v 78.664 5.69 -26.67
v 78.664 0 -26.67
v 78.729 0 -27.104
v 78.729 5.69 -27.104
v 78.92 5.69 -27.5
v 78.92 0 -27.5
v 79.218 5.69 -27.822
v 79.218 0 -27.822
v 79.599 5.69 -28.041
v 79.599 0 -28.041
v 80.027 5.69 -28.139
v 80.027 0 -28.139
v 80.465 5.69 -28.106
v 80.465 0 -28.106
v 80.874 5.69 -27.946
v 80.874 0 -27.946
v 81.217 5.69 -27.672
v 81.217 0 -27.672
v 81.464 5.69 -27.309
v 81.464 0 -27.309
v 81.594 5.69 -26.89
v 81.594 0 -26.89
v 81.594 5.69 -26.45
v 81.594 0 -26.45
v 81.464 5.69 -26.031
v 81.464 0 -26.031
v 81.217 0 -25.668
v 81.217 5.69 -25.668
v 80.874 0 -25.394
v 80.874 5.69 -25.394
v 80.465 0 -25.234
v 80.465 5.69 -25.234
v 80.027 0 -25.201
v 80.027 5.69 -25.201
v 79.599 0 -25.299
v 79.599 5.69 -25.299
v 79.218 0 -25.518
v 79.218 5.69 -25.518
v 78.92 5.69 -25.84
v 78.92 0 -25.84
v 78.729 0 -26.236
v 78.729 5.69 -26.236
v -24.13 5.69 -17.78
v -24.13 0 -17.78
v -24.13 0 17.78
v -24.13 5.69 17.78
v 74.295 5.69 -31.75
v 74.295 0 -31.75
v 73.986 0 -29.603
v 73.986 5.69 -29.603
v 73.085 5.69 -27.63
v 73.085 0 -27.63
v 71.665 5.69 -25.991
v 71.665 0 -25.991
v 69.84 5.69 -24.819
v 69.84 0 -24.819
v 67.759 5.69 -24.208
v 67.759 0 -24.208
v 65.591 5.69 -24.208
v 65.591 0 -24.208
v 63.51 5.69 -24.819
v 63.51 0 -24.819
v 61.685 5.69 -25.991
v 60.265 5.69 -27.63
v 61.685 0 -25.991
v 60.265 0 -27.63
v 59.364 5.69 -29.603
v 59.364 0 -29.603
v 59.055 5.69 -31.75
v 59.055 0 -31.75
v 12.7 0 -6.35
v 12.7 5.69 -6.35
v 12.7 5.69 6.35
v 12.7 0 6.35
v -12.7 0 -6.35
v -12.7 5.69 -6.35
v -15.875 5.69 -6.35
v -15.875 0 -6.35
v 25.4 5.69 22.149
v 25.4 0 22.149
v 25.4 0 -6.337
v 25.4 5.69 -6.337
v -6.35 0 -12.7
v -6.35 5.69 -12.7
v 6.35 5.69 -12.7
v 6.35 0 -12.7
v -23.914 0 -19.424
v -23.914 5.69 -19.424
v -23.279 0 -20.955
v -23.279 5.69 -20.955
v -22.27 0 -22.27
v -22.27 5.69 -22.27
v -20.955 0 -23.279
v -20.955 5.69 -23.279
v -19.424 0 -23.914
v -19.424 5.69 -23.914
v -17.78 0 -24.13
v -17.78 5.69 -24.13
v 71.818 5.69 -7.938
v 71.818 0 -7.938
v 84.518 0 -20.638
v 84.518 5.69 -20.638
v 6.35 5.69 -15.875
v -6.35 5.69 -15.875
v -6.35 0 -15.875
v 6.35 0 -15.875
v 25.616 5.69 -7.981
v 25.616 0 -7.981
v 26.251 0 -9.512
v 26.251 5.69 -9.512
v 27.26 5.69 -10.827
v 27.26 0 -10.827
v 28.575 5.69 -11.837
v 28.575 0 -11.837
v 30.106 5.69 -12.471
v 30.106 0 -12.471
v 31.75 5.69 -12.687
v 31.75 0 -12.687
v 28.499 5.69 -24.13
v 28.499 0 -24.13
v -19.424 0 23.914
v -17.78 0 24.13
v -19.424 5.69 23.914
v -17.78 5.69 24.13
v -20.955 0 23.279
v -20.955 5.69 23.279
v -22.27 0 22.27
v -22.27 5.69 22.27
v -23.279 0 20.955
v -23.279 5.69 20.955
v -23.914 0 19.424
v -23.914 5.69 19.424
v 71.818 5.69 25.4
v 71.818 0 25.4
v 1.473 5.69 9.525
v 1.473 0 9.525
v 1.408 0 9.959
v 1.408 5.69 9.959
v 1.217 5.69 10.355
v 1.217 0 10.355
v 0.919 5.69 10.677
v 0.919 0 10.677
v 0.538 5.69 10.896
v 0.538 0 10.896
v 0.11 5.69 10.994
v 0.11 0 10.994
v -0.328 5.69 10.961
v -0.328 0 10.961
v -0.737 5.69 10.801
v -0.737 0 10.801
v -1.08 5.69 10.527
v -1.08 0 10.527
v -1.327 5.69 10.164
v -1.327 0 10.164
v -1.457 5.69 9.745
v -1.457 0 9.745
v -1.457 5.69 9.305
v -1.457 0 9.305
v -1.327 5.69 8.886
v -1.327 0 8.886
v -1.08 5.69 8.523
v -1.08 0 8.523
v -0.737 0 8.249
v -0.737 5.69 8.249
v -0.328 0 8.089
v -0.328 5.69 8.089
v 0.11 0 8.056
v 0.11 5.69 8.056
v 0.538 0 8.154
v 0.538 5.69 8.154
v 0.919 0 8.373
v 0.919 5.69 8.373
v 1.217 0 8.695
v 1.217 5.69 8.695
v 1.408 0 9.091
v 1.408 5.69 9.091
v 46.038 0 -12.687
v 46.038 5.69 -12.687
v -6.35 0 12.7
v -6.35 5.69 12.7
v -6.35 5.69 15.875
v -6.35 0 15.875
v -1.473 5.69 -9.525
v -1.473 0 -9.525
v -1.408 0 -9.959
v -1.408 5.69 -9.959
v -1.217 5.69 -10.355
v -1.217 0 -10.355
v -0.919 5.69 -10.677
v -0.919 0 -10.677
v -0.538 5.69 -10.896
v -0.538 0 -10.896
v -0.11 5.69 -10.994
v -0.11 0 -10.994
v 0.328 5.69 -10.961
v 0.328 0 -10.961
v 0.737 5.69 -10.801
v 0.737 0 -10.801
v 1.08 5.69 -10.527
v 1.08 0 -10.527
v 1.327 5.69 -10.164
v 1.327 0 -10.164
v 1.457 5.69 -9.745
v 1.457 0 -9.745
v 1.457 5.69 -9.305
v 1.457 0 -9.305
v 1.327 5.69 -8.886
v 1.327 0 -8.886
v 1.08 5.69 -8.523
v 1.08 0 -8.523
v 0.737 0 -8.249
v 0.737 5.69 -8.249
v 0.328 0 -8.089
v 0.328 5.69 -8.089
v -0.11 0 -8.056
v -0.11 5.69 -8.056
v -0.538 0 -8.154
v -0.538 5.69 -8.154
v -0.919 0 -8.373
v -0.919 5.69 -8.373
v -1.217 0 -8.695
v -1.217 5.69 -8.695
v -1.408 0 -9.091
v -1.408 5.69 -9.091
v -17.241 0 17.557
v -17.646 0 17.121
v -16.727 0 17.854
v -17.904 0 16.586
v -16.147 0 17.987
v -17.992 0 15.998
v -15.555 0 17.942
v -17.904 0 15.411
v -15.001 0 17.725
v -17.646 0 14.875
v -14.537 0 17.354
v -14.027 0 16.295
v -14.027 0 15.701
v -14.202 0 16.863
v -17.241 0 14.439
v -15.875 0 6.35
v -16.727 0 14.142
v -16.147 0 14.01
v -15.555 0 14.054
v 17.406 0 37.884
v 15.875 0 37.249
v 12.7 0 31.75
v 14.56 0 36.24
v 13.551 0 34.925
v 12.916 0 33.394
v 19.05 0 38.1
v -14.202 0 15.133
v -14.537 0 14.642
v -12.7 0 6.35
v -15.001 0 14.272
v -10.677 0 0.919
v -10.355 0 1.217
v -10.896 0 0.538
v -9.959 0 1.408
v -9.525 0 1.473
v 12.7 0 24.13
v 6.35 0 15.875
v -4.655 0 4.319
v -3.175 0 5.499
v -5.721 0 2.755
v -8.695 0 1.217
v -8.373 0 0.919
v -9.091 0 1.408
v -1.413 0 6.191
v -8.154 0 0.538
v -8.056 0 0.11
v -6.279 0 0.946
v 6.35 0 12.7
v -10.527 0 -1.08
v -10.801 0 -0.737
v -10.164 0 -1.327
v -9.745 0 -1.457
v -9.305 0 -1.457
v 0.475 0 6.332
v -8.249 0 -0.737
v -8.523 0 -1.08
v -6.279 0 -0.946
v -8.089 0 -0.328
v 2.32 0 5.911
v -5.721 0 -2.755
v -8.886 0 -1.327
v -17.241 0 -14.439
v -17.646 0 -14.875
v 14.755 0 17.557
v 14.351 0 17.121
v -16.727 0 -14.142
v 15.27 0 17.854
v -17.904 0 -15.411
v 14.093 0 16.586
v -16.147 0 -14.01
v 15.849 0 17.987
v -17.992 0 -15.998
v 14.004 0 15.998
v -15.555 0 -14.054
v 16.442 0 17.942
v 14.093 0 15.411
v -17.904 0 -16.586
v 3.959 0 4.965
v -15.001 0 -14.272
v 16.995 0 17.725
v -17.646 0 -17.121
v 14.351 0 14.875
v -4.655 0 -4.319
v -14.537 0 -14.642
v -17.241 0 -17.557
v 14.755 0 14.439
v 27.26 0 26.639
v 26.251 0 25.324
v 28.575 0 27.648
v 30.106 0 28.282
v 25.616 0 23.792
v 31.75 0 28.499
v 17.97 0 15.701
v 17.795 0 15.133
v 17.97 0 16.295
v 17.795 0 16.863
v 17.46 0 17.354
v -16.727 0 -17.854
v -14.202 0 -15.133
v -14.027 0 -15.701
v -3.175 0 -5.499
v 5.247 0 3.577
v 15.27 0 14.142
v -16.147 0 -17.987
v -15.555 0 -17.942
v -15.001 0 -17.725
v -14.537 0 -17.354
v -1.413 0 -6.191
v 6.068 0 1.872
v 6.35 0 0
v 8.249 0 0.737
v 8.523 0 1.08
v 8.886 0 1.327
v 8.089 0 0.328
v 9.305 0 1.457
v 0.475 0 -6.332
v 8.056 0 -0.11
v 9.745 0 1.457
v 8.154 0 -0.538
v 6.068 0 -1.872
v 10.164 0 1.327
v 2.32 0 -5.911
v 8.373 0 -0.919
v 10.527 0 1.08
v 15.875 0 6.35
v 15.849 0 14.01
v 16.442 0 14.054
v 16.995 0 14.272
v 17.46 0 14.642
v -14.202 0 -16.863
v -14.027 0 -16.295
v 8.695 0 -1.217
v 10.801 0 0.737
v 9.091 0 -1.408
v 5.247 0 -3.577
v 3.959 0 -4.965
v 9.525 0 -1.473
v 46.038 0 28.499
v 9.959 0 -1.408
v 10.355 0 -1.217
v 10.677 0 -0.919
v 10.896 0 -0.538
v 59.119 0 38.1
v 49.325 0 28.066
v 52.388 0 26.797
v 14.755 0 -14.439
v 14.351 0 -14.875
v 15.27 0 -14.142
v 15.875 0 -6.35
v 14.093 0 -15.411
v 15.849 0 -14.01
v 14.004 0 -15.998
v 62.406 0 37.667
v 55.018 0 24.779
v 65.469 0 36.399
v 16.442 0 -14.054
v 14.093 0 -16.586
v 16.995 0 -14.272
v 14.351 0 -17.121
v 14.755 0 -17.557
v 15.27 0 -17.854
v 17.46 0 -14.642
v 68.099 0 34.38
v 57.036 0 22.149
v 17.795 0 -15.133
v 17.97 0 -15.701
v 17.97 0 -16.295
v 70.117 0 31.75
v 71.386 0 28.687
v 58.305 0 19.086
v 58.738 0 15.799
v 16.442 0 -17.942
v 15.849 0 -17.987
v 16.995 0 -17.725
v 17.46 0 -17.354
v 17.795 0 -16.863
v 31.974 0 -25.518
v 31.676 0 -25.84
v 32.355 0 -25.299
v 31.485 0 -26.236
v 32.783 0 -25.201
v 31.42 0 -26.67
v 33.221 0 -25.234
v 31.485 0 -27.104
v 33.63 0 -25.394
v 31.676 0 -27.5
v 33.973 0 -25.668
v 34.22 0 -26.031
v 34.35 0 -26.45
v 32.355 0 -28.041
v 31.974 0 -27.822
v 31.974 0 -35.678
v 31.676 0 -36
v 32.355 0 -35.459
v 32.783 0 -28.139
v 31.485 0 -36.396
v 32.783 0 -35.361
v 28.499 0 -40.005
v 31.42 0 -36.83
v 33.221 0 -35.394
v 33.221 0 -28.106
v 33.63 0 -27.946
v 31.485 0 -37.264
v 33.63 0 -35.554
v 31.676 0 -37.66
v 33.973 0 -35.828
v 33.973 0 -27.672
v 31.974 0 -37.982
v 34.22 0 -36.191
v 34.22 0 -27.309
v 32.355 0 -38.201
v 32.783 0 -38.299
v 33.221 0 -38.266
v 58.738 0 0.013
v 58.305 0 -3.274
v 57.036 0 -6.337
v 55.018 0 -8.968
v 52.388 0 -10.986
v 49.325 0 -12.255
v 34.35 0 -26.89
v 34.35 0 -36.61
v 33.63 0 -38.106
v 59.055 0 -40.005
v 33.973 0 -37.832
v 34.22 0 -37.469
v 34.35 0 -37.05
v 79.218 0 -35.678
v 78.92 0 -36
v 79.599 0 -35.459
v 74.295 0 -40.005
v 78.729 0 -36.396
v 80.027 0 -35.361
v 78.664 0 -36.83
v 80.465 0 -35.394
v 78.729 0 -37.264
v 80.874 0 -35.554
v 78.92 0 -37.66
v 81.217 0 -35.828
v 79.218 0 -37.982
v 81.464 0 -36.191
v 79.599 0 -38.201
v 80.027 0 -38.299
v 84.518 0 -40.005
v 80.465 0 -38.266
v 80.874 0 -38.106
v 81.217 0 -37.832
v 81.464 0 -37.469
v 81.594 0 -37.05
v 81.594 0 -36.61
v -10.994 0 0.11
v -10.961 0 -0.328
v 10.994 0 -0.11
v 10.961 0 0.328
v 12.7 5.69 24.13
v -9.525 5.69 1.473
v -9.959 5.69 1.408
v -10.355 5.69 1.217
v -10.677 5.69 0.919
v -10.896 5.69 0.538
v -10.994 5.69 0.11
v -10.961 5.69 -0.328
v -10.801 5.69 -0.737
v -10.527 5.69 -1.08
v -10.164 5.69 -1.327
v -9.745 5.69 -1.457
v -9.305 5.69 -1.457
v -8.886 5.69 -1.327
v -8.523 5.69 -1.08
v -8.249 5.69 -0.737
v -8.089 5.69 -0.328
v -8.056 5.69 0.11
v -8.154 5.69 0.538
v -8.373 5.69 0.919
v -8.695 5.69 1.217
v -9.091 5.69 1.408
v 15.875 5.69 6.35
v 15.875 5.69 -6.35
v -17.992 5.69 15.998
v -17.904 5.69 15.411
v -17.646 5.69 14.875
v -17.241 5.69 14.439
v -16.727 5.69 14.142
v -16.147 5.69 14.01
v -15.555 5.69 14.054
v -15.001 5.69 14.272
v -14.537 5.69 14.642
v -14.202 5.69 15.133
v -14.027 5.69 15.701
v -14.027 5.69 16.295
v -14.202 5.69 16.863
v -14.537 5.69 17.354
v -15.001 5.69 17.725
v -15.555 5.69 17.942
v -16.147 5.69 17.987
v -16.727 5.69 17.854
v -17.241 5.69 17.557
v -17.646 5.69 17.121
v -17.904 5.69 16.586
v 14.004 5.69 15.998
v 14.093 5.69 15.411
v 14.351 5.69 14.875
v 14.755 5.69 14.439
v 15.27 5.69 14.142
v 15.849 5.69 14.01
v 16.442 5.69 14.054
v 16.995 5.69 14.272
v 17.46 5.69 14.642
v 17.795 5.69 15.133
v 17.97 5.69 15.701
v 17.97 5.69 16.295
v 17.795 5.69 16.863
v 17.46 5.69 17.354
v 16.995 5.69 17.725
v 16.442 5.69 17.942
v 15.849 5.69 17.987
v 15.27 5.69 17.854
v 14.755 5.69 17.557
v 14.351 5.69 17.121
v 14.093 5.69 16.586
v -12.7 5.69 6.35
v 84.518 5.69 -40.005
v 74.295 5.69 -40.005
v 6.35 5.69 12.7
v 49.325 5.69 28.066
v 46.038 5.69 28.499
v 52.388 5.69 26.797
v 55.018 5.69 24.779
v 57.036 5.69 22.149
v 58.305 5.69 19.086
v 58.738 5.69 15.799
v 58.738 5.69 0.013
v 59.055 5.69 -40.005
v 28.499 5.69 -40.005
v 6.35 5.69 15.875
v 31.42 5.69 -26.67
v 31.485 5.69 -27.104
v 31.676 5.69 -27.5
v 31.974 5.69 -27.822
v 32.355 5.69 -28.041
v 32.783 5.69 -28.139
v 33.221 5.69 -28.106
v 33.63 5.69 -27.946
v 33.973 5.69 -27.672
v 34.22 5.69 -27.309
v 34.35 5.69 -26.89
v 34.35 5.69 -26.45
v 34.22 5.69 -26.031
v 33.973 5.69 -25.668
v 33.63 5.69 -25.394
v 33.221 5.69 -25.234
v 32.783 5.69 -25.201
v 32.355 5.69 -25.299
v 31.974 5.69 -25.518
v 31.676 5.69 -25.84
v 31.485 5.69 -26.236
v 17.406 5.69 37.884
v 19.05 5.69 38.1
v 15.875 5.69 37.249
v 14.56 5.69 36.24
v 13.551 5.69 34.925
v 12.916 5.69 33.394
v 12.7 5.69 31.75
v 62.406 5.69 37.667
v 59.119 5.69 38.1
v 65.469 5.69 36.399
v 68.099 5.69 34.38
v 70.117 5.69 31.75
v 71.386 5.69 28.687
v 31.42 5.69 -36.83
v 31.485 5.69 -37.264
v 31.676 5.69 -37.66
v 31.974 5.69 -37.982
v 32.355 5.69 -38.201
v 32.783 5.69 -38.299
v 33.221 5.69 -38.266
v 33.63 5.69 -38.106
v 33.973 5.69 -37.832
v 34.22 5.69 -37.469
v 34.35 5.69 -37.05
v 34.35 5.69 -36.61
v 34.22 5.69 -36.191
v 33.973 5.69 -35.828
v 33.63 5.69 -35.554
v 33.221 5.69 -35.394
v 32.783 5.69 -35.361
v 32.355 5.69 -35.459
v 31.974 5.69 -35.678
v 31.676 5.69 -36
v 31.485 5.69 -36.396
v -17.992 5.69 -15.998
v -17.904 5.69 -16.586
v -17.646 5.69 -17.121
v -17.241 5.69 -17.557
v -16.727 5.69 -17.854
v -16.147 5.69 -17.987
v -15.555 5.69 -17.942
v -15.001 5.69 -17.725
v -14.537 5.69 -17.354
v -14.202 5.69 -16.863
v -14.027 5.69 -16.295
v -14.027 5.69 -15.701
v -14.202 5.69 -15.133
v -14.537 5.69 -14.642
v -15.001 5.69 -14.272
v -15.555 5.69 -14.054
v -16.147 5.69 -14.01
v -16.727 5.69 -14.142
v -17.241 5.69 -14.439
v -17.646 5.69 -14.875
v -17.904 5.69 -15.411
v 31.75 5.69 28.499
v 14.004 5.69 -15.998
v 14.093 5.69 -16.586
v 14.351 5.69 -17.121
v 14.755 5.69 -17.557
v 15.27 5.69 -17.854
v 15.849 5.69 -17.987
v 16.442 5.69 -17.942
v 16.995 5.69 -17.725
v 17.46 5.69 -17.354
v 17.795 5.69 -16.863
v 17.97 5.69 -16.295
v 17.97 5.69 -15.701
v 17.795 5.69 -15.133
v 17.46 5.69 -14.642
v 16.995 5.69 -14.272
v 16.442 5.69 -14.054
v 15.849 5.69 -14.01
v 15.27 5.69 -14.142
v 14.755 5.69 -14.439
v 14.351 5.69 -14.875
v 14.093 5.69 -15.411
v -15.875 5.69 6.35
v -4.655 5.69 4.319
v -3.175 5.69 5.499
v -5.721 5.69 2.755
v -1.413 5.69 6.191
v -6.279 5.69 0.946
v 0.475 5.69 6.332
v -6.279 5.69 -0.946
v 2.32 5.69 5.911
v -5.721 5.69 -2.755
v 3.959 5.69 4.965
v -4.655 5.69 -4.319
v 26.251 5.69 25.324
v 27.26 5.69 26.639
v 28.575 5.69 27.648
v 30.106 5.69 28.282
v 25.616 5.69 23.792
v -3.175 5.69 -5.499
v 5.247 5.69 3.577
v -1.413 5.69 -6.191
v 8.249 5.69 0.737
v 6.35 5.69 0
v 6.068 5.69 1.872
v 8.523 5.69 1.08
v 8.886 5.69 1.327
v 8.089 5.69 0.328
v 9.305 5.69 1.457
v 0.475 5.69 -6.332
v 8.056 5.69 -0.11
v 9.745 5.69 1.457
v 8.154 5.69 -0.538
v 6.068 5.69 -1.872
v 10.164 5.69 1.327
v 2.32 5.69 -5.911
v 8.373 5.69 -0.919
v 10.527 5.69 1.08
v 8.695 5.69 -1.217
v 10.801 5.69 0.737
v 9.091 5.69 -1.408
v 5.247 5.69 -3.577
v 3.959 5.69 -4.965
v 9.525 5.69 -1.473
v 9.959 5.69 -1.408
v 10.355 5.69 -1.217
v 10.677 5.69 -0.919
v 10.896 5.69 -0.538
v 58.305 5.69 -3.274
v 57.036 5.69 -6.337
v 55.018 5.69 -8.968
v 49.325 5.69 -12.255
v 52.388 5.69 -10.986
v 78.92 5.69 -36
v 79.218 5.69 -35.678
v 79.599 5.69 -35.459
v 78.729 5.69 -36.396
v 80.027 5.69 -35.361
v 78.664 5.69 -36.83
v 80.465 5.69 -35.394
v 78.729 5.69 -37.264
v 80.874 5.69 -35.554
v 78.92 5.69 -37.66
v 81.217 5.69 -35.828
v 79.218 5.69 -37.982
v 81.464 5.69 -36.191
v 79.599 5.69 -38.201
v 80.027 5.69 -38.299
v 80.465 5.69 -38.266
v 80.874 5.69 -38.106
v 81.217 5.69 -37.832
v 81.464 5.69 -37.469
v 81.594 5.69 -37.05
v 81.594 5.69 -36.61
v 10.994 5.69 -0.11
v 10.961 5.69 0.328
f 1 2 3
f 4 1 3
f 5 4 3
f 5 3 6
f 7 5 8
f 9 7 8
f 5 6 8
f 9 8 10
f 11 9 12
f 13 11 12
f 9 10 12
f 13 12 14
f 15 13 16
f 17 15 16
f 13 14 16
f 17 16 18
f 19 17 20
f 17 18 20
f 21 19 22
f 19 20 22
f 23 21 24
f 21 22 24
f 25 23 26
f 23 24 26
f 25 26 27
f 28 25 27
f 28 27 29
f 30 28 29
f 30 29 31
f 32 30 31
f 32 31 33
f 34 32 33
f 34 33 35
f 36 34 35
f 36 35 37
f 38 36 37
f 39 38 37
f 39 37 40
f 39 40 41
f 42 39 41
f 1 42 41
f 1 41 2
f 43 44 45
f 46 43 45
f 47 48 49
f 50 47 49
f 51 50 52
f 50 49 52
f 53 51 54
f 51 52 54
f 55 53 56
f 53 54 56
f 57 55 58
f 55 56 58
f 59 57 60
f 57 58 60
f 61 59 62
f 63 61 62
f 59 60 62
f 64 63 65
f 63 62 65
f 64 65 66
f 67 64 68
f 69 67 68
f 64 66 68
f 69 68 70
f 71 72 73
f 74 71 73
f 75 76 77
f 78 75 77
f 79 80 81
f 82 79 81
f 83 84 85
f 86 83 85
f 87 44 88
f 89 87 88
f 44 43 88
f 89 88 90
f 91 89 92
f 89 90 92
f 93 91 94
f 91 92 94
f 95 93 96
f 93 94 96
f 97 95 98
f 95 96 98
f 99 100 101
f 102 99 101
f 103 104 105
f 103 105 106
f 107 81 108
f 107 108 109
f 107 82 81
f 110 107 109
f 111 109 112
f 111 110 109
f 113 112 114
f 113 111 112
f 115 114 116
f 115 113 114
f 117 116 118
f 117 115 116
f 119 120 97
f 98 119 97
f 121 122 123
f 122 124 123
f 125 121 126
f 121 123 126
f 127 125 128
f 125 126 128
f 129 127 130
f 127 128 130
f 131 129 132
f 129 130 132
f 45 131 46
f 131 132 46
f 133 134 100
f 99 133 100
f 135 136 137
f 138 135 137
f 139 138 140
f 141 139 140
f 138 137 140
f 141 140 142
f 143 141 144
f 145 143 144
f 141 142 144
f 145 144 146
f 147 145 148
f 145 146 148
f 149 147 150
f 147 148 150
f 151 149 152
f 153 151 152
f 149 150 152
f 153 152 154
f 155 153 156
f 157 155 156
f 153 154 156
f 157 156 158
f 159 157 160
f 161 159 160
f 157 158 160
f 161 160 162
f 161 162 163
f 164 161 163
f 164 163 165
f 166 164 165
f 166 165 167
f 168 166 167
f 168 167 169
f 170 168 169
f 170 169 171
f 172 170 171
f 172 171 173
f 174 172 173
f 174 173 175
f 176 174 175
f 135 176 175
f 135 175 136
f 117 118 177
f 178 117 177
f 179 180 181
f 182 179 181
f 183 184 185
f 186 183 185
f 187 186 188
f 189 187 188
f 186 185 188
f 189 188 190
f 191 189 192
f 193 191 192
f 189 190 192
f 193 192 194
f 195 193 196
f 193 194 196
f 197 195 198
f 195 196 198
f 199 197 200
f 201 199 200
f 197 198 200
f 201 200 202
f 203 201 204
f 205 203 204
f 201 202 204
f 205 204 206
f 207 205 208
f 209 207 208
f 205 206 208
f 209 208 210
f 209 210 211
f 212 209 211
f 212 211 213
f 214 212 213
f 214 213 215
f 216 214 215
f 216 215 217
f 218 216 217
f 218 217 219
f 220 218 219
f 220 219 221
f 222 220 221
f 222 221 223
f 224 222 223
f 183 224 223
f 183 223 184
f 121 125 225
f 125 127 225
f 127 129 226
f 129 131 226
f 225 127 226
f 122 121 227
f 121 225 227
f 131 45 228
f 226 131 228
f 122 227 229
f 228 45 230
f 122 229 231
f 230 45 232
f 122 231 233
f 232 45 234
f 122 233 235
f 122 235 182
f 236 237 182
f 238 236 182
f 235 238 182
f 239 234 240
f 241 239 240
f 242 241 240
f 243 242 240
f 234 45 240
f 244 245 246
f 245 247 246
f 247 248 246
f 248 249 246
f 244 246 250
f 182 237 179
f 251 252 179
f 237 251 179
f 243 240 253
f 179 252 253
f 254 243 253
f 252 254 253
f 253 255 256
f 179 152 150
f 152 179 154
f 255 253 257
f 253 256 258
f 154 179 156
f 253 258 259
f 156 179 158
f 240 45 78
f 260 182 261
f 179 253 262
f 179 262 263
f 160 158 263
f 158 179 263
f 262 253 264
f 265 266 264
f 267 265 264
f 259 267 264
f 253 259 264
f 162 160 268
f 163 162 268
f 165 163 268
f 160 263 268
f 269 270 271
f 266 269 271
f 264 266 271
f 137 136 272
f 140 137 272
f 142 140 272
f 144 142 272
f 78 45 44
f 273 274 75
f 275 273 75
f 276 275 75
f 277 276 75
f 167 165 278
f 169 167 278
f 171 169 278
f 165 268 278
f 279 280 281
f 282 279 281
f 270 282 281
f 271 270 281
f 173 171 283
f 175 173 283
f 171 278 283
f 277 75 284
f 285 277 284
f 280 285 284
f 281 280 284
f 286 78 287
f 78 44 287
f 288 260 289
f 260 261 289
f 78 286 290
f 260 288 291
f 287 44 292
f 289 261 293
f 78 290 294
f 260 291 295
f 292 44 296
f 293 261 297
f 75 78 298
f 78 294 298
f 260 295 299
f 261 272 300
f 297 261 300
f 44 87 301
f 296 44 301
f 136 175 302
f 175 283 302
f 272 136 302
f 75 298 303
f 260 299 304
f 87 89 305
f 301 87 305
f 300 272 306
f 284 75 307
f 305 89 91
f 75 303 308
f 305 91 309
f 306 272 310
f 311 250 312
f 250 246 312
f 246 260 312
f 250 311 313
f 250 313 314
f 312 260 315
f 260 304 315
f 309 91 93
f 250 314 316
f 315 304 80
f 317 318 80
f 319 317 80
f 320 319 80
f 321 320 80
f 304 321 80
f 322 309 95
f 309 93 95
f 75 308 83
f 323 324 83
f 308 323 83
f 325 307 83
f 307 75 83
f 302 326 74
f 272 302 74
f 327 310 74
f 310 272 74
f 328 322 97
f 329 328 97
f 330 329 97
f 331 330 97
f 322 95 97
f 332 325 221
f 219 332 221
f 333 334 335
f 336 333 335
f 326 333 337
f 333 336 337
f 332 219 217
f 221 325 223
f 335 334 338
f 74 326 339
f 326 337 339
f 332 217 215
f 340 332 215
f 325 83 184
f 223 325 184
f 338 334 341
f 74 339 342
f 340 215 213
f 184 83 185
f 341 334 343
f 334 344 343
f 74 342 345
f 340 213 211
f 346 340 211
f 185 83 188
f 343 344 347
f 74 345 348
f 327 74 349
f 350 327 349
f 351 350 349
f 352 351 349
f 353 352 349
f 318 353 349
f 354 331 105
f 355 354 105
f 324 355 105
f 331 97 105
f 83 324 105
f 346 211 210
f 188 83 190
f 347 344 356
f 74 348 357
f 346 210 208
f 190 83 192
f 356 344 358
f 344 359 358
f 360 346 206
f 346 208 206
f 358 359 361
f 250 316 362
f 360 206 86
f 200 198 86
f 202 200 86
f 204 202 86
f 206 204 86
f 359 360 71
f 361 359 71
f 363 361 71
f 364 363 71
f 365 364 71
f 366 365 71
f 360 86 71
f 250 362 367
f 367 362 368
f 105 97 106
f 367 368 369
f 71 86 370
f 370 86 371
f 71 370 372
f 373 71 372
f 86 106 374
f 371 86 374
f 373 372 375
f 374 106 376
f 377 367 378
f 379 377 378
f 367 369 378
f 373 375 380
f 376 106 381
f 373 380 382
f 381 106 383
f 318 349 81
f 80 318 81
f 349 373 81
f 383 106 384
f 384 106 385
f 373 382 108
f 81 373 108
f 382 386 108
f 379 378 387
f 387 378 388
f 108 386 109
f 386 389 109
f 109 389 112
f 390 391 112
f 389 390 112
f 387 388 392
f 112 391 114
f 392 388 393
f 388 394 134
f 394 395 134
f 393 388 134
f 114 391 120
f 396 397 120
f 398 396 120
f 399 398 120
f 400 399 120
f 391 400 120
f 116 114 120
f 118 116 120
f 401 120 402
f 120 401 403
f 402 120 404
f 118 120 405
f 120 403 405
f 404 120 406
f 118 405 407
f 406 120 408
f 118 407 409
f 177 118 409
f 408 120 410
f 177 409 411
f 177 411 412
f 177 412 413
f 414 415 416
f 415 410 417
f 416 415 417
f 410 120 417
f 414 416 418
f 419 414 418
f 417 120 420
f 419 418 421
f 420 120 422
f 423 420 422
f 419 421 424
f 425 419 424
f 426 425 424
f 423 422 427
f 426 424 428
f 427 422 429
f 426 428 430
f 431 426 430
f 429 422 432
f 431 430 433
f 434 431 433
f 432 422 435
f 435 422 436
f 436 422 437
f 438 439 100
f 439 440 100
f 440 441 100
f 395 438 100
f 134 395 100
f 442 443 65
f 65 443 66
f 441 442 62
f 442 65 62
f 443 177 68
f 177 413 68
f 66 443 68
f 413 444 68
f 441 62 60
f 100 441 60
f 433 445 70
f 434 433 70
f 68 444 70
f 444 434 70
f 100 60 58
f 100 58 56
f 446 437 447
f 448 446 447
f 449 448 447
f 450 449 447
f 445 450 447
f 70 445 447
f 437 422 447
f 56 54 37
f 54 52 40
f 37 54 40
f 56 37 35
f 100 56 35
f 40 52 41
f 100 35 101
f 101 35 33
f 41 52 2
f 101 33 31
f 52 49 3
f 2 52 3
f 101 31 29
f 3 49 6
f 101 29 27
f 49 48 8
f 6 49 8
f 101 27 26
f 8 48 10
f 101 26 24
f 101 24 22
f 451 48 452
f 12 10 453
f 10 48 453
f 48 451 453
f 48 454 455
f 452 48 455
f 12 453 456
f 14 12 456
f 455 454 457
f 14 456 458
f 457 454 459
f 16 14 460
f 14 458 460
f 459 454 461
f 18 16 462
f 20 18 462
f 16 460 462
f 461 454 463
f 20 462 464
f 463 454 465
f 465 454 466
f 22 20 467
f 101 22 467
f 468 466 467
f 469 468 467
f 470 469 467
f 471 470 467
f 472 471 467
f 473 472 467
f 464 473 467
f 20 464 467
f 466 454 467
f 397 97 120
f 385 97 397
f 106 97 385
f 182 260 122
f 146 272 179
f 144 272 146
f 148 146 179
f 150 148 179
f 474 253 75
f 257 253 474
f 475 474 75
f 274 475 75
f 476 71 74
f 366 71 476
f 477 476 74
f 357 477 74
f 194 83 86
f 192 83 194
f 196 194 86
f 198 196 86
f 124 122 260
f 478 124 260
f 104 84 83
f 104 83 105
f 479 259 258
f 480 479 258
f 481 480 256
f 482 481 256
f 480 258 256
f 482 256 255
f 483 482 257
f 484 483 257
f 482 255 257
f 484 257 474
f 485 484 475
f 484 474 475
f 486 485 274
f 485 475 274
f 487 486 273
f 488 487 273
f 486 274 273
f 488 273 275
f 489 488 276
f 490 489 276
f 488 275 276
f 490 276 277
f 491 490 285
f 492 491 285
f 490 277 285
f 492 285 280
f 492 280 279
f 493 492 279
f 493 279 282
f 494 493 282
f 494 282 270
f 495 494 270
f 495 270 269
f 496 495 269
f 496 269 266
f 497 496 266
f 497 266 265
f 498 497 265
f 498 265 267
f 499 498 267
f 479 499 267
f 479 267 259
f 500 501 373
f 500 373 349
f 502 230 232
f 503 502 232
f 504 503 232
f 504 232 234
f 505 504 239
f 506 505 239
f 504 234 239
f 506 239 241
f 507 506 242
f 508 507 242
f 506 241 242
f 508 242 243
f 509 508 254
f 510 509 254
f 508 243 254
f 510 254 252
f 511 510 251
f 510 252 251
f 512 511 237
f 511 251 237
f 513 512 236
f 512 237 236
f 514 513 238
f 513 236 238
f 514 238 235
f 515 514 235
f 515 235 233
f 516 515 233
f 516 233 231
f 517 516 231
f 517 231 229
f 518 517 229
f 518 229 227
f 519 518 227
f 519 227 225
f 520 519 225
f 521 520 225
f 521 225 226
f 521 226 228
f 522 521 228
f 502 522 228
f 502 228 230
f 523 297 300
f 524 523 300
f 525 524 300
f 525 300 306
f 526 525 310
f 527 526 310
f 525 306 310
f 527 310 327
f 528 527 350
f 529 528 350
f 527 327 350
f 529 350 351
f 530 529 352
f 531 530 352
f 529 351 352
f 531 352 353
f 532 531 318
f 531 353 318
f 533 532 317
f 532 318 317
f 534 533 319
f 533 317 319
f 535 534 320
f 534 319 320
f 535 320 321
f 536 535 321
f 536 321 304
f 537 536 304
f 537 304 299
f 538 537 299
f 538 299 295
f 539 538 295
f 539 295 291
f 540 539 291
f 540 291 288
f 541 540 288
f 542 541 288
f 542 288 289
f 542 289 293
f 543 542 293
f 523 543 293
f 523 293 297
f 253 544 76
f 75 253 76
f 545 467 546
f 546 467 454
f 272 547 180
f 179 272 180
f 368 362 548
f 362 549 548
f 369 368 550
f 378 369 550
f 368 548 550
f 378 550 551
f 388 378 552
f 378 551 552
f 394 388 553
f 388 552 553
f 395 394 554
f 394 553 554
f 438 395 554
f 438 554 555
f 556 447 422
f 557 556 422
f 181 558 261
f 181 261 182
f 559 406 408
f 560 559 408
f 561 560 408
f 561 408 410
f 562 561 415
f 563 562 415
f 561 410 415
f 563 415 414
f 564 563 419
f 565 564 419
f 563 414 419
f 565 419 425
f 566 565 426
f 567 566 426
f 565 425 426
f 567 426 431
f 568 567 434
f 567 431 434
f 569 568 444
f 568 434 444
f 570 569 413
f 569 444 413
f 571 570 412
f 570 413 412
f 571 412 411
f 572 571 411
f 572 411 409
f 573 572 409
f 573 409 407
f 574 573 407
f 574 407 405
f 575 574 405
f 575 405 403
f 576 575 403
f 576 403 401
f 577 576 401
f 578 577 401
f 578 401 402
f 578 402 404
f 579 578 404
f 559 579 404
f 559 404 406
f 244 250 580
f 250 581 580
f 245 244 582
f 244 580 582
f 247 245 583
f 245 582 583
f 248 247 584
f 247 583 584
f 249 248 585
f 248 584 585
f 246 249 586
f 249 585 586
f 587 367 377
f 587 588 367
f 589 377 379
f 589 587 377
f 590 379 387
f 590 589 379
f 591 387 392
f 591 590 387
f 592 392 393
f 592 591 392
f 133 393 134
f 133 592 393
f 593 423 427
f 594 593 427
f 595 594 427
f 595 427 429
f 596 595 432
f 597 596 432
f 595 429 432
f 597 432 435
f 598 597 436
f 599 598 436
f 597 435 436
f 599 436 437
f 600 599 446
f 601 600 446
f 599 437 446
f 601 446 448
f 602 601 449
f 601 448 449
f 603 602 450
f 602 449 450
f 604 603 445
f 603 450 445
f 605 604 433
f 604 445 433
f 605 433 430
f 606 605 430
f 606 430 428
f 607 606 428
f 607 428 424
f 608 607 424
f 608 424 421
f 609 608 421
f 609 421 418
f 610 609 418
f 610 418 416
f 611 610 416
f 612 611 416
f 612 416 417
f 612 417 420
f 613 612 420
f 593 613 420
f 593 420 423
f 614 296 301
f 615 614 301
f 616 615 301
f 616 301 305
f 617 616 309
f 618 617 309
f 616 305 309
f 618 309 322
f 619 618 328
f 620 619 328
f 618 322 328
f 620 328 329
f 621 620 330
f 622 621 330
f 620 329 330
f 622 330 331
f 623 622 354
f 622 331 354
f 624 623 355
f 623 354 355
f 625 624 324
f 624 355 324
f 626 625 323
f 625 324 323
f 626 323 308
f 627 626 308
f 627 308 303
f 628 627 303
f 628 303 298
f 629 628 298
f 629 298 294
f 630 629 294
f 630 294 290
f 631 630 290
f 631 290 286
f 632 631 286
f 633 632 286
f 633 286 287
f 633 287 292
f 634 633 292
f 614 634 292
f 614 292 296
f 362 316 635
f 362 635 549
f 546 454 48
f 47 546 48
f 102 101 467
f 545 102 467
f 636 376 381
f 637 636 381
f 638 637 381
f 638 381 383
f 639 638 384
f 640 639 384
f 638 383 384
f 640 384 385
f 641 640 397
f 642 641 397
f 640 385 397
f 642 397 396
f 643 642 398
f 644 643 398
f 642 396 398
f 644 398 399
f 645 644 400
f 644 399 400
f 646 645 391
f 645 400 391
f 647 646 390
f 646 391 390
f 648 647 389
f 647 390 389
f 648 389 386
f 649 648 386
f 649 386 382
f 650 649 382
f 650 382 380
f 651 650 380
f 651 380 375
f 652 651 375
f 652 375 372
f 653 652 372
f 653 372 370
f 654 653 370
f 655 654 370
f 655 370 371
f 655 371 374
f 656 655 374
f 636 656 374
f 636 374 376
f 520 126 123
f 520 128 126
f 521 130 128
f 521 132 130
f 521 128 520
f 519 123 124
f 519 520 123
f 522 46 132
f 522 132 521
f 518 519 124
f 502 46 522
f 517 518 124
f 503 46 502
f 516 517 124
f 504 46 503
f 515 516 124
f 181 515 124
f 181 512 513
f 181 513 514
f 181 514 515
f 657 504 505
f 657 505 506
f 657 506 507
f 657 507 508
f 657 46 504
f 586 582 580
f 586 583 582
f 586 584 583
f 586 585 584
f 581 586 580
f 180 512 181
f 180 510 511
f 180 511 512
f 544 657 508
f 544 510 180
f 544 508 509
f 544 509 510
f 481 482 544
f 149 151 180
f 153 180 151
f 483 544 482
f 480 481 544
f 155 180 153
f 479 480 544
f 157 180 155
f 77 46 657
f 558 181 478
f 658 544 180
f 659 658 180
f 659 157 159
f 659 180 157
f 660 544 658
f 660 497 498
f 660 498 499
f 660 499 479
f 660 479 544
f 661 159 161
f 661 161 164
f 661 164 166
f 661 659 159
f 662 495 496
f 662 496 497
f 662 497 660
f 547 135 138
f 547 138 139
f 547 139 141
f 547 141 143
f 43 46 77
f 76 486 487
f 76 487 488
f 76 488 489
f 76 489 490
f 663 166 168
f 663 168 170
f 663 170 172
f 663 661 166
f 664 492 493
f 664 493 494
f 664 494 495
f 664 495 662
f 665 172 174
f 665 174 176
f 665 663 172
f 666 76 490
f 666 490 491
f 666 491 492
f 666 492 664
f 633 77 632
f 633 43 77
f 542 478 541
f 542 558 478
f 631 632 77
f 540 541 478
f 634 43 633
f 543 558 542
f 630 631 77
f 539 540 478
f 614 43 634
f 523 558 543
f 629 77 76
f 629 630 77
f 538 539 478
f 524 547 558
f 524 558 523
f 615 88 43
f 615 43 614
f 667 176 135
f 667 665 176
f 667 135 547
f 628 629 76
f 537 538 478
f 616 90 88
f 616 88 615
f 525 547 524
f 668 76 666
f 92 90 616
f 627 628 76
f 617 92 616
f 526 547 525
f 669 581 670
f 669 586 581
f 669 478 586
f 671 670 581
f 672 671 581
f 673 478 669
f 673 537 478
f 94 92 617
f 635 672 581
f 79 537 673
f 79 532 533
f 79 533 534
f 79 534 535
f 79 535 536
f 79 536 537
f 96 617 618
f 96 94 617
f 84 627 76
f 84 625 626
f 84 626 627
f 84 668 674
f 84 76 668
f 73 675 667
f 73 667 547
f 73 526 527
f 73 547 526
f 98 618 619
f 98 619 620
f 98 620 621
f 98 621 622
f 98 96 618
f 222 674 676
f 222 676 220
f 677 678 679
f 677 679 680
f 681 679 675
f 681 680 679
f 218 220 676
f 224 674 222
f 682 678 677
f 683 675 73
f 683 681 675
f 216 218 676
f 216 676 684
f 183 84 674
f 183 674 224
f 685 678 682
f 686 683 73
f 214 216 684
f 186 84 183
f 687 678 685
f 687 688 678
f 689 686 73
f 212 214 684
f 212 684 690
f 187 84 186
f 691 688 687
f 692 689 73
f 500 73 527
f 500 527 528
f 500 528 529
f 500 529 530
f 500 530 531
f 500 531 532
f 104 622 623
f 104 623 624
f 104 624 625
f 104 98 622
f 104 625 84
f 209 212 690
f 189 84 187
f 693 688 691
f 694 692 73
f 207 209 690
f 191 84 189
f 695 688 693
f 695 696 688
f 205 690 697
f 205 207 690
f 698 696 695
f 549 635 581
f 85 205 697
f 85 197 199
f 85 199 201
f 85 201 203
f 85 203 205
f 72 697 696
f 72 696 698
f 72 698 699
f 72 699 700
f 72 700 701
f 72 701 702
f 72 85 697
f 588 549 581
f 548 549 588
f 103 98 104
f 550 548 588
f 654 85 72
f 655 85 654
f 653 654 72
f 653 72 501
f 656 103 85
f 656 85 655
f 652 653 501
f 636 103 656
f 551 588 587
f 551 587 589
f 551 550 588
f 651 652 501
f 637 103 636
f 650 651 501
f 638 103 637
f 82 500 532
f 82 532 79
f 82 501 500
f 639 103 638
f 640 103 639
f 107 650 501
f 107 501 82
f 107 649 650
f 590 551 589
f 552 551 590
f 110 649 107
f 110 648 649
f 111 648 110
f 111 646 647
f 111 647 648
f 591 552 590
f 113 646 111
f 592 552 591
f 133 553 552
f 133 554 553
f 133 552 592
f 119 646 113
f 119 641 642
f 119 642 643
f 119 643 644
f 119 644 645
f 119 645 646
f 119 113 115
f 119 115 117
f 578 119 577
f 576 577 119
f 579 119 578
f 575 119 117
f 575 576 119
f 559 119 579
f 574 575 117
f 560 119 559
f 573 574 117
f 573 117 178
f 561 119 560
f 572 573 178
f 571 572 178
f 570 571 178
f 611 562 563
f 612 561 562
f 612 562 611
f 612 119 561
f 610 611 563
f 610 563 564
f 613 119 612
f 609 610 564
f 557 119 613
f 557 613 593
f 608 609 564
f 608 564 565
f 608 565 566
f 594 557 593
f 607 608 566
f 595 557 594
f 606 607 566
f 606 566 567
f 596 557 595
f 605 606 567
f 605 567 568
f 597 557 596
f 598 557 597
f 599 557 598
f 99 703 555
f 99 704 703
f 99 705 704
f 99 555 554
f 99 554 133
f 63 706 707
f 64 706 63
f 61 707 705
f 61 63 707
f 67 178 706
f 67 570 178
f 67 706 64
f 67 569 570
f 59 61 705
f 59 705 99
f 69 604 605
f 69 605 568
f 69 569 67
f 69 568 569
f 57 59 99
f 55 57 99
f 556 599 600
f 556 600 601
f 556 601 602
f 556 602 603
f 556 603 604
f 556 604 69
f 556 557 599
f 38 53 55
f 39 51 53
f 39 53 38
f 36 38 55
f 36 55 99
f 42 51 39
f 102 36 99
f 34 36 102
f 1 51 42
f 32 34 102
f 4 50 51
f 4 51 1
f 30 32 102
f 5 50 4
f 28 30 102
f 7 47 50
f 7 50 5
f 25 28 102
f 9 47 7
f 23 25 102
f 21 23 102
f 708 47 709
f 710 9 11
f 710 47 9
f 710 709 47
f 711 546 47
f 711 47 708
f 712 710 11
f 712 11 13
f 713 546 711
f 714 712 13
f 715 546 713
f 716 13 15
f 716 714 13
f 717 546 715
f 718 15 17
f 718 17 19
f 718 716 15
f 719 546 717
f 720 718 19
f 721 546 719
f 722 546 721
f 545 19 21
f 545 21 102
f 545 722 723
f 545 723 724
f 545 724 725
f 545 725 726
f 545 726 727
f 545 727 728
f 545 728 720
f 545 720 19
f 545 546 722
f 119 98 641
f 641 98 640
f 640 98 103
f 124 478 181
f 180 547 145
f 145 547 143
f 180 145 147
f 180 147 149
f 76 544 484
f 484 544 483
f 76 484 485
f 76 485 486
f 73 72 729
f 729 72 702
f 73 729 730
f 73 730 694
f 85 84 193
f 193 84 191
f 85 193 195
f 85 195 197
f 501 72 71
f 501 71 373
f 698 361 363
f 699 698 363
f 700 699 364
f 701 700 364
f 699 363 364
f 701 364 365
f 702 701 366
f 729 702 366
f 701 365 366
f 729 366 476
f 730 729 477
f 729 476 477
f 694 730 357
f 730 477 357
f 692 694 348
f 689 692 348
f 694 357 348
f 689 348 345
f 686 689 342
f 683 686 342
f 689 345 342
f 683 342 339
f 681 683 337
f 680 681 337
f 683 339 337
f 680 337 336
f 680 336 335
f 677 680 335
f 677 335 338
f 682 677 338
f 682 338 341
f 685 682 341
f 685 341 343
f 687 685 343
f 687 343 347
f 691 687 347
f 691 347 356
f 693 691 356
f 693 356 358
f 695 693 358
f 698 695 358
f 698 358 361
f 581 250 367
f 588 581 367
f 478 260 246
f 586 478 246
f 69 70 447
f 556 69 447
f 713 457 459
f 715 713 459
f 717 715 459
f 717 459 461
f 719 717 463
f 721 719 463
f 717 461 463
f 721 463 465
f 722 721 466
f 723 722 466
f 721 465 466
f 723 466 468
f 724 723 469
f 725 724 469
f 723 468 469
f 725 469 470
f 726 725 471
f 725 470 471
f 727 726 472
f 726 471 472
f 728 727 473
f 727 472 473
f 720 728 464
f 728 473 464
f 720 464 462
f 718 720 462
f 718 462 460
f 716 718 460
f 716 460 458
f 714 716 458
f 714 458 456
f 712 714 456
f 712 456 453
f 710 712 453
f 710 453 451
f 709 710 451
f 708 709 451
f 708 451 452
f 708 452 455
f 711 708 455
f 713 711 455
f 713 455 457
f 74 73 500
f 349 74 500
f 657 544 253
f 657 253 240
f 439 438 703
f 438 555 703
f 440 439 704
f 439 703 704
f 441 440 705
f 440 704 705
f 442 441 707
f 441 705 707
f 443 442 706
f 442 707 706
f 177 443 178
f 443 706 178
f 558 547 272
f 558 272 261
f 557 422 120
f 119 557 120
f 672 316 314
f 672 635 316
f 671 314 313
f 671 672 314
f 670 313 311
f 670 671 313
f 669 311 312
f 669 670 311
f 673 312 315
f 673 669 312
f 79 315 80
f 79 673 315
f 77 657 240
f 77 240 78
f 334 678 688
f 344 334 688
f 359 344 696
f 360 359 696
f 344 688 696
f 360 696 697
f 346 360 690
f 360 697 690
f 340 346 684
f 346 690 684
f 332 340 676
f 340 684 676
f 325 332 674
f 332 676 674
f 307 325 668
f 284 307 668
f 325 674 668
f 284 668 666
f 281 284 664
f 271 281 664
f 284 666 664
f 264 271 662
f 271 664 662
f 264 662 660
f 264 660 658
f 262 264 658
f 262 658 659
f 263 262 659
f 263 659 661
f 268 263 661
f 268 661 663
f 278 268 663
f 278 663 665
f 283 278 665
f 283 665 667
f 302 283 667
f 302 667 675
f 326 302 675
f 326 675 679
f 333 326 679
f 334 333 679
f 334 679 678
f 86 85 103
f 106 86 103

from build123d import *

# Parameters (mm, degrees)
SKETCH1_W                   = 33.3375
SKETCH1_H                   = 41.1861
BOSS_EXTRUDE1_DEPTH         = 5.6896
FILLET1_R                   = 12.7
FILLET2_R                   = 6.35
CUT_EXTRUDE3_REACH          = 7.69
SKETCH11_R                  = 6.35
SKETCH8_W                   = 12.7
SKETCH8_H                   = 3.175
CUT_EXTRUDE2_DEPTH          = 5.6896
F_4_CLEARANCE_HOLE3_D       = 2.9464
F_4_CLEARANCE_HOLE3_DEPTH   = 5.6906
CIRPATTERN1_COUNT           = 4
FILLET3_R                   = 12.7
F_4_CLEARANCE_HOLE4_D       = 2.9464
TAP_DRILL_FOR_4_HELICOIL1_D = 3.9878
FILLET4_R                   = 6.35


with BuildPart() as part:
    # Sketch1 → Boss-Extrude1 (new body)
    with BuildSketch(Plane(origin=(0, 0, 0), x_dir=(1, 0, 0), z_dir=(0, 1, 0))):
        with BuildLine():
            Line((28.4988, 40.005), (28.4988, 24.13))
            Line((28.4988, 24.13), (0, 24.13))
            Line((0, 24.13), (-24.13, 24.13))
            Line((-24.13, 24.13), (-24.13, 0))
            Line((-24.13, 0), (-24.13, -24.13))
            Line((-24.13, -24.13), (0, -24.13))
            Line((0, -24.13), (12.7, -24.13))
            Line((12.7, -24.13), (12.7, -38.1))
            Line((12.7, -38.1), (71.8185, -38.1))
            Line((71.8185, -38.1), (71.8185, 7.9375))
            Line((71.8185, 7.9375), (84.5185, 20.6375))
            Line((84.5185, 20.6375), (84.5185, 40.005))
            Line((84.5185, 40.005), (74.295, 40.005))
            Line((74.295, 40.005), (74.295, 31.75))
            ThreePointArc((74.295, 31.75), (66.675, 24.13), (59.055, 31.75))
            Line((59.055, 31.75), (59.055, 40.005))
            Line((59.055, 40.005), (28.4988, 40.005))
        make_face()
        with Locations((42.06875, -7.90575)):
            Rectangle(SKETCH1_W, SKETCH1_H, mode=Mode.SUBTRACT)
    extrude(amount=BOSS_EXTRUDE1_DEPTH)

    # Fillet1
    fillet1_edges = [part.edges().sort_by_distance(p)[0] for p in [
        (58.7375, 2.8448, 28.4988),
        (58.7375, 2.8448, -12.6873),
    ]]
    fillet(fillet1_edges, radius=FILLET1_R)

    # Fillet2
    fillet2_edges = [part.edges().sort_by_distance(p)[0] for p in [
        (25.4, 2.8448, -12.6873),
        (25.4, 2.8448, 28.4988),
    ]]
    fillet(fillet2_edges, radius=FILLET2_R)

    # Sketch11 → Cut-Extrude3 (cut, up to next)
    with BuildSketch(Plane(origin=(0, 5.6896, 0), x_dir=(1, 0, 0), z_dir=(0, 1, 0)), mode=Mode.PRIVATE) as cut_extrude3_sk1:
        Circle(SKETCH11_R)
    cut_extrude3_tool1 = extrude(cut_extrude3_sk1.sketch, amount=-CUT_EXTRUDE3_REACH, mode=Mode.PRIVATE) & part.part
    add(cut_extrude3_tool1.solids().sort_by_distance((0, 5.6896, 0))[0], mode=Mode.SUBTRACT)

    # Sketch8 → Cut-Extrude2 (cut)
    with BuildSketch(Plane(origin=(0, 5.6896, 0), x_dir=(1, 0, 0), z_dir=(0, 1, 0))):
        with Locations((0, 14.2875)):
            Rectangle(SKETCH8_W, SKETCH8_H)
    cut_extrude2 = extrude(amount=-CUT_EXTRUDE2_DEPTH, mode=Mode.SUBTRACT)

    # #4 Clearance Hole3
    with Locations(Plane(origin=(0, 5.6896, 0), x_dir=(1, 0, 0), z_dir=(0, 1, 0))):
        with Locations((0, 9.525)):
            f_4_clearance_hole3 = Hole(F_4_CLEARANCE_HOLE3_D / 2, depth=F_4_CLEARANCE_HOLE3_DEPTH)

    # CirPattern1: Cut-Extrude2, #4 Clearance Hole3 ×4 about axis
    cirpattern1_axis = Axis((0, 0, 0), (0, 1, 0))
    for i in range(1, CIRPATTERN1_COUNT):
        add(cut_extrude2.rotate(cirpattern1_axis, i * 360 / CIRPATTERN1_COUNT), mode=Mode.SUBTRACT)
        add(f_4_clearance_hole3.rotate(cirpattern1_axis, i * 360 / CIRPATTERN1_COUNT), mode=Mode.SUBTRACT)

    # Fillet3
    fillet3_edges = [part.edges().sort_by_distance(p)[0] for p in [
        (71.8185, 2.8448, 38.1),
    ]]
    fillet(fillet3_edges, radius=FILLET3_R)

    # #4 Clearance Hole4 (through all)
    with Locations(Plane(origin=(0, 5.6896, 0), x_dir=(1, 0, 0), z_dir=(0, 1, 0))):
        with Locations((32.893, 36.83), (80.137, 36.83), (80.137, 26.67), (32.893, 26.67)):
            Hole(F_4_CLEARANCE_HOLE4_D / 2)

    # Tap Drill for #4 Helicoil1 (through all)
    with Locations(Plane(origin=(0, 5.6896, 0), x_dir=(1, 0, 0), z_dir=(0, 1, 0))):
        with Locations((-15.998290924, 15.998290924), (15.998290924, -15.998290924), (15.998290924, 15.998290924), (-15.998290924, -15.998290924), (0, 0)):
            Hole(TAP_DRILL_FOR_4_HELICOIL1_D / 2)

    # Fillet4
    fillet4_edges = [part.edges().sort_by_distance(p)[0] for p in [
        (12.7, 2.8448, 38.1),
        (-24.13, 2.8448, 24.13),
        (-24.13, 2.8448, -24.13),
    ]]
    fillet(fillet4_edges, radius=FILLET4_R)


solid = part.part
